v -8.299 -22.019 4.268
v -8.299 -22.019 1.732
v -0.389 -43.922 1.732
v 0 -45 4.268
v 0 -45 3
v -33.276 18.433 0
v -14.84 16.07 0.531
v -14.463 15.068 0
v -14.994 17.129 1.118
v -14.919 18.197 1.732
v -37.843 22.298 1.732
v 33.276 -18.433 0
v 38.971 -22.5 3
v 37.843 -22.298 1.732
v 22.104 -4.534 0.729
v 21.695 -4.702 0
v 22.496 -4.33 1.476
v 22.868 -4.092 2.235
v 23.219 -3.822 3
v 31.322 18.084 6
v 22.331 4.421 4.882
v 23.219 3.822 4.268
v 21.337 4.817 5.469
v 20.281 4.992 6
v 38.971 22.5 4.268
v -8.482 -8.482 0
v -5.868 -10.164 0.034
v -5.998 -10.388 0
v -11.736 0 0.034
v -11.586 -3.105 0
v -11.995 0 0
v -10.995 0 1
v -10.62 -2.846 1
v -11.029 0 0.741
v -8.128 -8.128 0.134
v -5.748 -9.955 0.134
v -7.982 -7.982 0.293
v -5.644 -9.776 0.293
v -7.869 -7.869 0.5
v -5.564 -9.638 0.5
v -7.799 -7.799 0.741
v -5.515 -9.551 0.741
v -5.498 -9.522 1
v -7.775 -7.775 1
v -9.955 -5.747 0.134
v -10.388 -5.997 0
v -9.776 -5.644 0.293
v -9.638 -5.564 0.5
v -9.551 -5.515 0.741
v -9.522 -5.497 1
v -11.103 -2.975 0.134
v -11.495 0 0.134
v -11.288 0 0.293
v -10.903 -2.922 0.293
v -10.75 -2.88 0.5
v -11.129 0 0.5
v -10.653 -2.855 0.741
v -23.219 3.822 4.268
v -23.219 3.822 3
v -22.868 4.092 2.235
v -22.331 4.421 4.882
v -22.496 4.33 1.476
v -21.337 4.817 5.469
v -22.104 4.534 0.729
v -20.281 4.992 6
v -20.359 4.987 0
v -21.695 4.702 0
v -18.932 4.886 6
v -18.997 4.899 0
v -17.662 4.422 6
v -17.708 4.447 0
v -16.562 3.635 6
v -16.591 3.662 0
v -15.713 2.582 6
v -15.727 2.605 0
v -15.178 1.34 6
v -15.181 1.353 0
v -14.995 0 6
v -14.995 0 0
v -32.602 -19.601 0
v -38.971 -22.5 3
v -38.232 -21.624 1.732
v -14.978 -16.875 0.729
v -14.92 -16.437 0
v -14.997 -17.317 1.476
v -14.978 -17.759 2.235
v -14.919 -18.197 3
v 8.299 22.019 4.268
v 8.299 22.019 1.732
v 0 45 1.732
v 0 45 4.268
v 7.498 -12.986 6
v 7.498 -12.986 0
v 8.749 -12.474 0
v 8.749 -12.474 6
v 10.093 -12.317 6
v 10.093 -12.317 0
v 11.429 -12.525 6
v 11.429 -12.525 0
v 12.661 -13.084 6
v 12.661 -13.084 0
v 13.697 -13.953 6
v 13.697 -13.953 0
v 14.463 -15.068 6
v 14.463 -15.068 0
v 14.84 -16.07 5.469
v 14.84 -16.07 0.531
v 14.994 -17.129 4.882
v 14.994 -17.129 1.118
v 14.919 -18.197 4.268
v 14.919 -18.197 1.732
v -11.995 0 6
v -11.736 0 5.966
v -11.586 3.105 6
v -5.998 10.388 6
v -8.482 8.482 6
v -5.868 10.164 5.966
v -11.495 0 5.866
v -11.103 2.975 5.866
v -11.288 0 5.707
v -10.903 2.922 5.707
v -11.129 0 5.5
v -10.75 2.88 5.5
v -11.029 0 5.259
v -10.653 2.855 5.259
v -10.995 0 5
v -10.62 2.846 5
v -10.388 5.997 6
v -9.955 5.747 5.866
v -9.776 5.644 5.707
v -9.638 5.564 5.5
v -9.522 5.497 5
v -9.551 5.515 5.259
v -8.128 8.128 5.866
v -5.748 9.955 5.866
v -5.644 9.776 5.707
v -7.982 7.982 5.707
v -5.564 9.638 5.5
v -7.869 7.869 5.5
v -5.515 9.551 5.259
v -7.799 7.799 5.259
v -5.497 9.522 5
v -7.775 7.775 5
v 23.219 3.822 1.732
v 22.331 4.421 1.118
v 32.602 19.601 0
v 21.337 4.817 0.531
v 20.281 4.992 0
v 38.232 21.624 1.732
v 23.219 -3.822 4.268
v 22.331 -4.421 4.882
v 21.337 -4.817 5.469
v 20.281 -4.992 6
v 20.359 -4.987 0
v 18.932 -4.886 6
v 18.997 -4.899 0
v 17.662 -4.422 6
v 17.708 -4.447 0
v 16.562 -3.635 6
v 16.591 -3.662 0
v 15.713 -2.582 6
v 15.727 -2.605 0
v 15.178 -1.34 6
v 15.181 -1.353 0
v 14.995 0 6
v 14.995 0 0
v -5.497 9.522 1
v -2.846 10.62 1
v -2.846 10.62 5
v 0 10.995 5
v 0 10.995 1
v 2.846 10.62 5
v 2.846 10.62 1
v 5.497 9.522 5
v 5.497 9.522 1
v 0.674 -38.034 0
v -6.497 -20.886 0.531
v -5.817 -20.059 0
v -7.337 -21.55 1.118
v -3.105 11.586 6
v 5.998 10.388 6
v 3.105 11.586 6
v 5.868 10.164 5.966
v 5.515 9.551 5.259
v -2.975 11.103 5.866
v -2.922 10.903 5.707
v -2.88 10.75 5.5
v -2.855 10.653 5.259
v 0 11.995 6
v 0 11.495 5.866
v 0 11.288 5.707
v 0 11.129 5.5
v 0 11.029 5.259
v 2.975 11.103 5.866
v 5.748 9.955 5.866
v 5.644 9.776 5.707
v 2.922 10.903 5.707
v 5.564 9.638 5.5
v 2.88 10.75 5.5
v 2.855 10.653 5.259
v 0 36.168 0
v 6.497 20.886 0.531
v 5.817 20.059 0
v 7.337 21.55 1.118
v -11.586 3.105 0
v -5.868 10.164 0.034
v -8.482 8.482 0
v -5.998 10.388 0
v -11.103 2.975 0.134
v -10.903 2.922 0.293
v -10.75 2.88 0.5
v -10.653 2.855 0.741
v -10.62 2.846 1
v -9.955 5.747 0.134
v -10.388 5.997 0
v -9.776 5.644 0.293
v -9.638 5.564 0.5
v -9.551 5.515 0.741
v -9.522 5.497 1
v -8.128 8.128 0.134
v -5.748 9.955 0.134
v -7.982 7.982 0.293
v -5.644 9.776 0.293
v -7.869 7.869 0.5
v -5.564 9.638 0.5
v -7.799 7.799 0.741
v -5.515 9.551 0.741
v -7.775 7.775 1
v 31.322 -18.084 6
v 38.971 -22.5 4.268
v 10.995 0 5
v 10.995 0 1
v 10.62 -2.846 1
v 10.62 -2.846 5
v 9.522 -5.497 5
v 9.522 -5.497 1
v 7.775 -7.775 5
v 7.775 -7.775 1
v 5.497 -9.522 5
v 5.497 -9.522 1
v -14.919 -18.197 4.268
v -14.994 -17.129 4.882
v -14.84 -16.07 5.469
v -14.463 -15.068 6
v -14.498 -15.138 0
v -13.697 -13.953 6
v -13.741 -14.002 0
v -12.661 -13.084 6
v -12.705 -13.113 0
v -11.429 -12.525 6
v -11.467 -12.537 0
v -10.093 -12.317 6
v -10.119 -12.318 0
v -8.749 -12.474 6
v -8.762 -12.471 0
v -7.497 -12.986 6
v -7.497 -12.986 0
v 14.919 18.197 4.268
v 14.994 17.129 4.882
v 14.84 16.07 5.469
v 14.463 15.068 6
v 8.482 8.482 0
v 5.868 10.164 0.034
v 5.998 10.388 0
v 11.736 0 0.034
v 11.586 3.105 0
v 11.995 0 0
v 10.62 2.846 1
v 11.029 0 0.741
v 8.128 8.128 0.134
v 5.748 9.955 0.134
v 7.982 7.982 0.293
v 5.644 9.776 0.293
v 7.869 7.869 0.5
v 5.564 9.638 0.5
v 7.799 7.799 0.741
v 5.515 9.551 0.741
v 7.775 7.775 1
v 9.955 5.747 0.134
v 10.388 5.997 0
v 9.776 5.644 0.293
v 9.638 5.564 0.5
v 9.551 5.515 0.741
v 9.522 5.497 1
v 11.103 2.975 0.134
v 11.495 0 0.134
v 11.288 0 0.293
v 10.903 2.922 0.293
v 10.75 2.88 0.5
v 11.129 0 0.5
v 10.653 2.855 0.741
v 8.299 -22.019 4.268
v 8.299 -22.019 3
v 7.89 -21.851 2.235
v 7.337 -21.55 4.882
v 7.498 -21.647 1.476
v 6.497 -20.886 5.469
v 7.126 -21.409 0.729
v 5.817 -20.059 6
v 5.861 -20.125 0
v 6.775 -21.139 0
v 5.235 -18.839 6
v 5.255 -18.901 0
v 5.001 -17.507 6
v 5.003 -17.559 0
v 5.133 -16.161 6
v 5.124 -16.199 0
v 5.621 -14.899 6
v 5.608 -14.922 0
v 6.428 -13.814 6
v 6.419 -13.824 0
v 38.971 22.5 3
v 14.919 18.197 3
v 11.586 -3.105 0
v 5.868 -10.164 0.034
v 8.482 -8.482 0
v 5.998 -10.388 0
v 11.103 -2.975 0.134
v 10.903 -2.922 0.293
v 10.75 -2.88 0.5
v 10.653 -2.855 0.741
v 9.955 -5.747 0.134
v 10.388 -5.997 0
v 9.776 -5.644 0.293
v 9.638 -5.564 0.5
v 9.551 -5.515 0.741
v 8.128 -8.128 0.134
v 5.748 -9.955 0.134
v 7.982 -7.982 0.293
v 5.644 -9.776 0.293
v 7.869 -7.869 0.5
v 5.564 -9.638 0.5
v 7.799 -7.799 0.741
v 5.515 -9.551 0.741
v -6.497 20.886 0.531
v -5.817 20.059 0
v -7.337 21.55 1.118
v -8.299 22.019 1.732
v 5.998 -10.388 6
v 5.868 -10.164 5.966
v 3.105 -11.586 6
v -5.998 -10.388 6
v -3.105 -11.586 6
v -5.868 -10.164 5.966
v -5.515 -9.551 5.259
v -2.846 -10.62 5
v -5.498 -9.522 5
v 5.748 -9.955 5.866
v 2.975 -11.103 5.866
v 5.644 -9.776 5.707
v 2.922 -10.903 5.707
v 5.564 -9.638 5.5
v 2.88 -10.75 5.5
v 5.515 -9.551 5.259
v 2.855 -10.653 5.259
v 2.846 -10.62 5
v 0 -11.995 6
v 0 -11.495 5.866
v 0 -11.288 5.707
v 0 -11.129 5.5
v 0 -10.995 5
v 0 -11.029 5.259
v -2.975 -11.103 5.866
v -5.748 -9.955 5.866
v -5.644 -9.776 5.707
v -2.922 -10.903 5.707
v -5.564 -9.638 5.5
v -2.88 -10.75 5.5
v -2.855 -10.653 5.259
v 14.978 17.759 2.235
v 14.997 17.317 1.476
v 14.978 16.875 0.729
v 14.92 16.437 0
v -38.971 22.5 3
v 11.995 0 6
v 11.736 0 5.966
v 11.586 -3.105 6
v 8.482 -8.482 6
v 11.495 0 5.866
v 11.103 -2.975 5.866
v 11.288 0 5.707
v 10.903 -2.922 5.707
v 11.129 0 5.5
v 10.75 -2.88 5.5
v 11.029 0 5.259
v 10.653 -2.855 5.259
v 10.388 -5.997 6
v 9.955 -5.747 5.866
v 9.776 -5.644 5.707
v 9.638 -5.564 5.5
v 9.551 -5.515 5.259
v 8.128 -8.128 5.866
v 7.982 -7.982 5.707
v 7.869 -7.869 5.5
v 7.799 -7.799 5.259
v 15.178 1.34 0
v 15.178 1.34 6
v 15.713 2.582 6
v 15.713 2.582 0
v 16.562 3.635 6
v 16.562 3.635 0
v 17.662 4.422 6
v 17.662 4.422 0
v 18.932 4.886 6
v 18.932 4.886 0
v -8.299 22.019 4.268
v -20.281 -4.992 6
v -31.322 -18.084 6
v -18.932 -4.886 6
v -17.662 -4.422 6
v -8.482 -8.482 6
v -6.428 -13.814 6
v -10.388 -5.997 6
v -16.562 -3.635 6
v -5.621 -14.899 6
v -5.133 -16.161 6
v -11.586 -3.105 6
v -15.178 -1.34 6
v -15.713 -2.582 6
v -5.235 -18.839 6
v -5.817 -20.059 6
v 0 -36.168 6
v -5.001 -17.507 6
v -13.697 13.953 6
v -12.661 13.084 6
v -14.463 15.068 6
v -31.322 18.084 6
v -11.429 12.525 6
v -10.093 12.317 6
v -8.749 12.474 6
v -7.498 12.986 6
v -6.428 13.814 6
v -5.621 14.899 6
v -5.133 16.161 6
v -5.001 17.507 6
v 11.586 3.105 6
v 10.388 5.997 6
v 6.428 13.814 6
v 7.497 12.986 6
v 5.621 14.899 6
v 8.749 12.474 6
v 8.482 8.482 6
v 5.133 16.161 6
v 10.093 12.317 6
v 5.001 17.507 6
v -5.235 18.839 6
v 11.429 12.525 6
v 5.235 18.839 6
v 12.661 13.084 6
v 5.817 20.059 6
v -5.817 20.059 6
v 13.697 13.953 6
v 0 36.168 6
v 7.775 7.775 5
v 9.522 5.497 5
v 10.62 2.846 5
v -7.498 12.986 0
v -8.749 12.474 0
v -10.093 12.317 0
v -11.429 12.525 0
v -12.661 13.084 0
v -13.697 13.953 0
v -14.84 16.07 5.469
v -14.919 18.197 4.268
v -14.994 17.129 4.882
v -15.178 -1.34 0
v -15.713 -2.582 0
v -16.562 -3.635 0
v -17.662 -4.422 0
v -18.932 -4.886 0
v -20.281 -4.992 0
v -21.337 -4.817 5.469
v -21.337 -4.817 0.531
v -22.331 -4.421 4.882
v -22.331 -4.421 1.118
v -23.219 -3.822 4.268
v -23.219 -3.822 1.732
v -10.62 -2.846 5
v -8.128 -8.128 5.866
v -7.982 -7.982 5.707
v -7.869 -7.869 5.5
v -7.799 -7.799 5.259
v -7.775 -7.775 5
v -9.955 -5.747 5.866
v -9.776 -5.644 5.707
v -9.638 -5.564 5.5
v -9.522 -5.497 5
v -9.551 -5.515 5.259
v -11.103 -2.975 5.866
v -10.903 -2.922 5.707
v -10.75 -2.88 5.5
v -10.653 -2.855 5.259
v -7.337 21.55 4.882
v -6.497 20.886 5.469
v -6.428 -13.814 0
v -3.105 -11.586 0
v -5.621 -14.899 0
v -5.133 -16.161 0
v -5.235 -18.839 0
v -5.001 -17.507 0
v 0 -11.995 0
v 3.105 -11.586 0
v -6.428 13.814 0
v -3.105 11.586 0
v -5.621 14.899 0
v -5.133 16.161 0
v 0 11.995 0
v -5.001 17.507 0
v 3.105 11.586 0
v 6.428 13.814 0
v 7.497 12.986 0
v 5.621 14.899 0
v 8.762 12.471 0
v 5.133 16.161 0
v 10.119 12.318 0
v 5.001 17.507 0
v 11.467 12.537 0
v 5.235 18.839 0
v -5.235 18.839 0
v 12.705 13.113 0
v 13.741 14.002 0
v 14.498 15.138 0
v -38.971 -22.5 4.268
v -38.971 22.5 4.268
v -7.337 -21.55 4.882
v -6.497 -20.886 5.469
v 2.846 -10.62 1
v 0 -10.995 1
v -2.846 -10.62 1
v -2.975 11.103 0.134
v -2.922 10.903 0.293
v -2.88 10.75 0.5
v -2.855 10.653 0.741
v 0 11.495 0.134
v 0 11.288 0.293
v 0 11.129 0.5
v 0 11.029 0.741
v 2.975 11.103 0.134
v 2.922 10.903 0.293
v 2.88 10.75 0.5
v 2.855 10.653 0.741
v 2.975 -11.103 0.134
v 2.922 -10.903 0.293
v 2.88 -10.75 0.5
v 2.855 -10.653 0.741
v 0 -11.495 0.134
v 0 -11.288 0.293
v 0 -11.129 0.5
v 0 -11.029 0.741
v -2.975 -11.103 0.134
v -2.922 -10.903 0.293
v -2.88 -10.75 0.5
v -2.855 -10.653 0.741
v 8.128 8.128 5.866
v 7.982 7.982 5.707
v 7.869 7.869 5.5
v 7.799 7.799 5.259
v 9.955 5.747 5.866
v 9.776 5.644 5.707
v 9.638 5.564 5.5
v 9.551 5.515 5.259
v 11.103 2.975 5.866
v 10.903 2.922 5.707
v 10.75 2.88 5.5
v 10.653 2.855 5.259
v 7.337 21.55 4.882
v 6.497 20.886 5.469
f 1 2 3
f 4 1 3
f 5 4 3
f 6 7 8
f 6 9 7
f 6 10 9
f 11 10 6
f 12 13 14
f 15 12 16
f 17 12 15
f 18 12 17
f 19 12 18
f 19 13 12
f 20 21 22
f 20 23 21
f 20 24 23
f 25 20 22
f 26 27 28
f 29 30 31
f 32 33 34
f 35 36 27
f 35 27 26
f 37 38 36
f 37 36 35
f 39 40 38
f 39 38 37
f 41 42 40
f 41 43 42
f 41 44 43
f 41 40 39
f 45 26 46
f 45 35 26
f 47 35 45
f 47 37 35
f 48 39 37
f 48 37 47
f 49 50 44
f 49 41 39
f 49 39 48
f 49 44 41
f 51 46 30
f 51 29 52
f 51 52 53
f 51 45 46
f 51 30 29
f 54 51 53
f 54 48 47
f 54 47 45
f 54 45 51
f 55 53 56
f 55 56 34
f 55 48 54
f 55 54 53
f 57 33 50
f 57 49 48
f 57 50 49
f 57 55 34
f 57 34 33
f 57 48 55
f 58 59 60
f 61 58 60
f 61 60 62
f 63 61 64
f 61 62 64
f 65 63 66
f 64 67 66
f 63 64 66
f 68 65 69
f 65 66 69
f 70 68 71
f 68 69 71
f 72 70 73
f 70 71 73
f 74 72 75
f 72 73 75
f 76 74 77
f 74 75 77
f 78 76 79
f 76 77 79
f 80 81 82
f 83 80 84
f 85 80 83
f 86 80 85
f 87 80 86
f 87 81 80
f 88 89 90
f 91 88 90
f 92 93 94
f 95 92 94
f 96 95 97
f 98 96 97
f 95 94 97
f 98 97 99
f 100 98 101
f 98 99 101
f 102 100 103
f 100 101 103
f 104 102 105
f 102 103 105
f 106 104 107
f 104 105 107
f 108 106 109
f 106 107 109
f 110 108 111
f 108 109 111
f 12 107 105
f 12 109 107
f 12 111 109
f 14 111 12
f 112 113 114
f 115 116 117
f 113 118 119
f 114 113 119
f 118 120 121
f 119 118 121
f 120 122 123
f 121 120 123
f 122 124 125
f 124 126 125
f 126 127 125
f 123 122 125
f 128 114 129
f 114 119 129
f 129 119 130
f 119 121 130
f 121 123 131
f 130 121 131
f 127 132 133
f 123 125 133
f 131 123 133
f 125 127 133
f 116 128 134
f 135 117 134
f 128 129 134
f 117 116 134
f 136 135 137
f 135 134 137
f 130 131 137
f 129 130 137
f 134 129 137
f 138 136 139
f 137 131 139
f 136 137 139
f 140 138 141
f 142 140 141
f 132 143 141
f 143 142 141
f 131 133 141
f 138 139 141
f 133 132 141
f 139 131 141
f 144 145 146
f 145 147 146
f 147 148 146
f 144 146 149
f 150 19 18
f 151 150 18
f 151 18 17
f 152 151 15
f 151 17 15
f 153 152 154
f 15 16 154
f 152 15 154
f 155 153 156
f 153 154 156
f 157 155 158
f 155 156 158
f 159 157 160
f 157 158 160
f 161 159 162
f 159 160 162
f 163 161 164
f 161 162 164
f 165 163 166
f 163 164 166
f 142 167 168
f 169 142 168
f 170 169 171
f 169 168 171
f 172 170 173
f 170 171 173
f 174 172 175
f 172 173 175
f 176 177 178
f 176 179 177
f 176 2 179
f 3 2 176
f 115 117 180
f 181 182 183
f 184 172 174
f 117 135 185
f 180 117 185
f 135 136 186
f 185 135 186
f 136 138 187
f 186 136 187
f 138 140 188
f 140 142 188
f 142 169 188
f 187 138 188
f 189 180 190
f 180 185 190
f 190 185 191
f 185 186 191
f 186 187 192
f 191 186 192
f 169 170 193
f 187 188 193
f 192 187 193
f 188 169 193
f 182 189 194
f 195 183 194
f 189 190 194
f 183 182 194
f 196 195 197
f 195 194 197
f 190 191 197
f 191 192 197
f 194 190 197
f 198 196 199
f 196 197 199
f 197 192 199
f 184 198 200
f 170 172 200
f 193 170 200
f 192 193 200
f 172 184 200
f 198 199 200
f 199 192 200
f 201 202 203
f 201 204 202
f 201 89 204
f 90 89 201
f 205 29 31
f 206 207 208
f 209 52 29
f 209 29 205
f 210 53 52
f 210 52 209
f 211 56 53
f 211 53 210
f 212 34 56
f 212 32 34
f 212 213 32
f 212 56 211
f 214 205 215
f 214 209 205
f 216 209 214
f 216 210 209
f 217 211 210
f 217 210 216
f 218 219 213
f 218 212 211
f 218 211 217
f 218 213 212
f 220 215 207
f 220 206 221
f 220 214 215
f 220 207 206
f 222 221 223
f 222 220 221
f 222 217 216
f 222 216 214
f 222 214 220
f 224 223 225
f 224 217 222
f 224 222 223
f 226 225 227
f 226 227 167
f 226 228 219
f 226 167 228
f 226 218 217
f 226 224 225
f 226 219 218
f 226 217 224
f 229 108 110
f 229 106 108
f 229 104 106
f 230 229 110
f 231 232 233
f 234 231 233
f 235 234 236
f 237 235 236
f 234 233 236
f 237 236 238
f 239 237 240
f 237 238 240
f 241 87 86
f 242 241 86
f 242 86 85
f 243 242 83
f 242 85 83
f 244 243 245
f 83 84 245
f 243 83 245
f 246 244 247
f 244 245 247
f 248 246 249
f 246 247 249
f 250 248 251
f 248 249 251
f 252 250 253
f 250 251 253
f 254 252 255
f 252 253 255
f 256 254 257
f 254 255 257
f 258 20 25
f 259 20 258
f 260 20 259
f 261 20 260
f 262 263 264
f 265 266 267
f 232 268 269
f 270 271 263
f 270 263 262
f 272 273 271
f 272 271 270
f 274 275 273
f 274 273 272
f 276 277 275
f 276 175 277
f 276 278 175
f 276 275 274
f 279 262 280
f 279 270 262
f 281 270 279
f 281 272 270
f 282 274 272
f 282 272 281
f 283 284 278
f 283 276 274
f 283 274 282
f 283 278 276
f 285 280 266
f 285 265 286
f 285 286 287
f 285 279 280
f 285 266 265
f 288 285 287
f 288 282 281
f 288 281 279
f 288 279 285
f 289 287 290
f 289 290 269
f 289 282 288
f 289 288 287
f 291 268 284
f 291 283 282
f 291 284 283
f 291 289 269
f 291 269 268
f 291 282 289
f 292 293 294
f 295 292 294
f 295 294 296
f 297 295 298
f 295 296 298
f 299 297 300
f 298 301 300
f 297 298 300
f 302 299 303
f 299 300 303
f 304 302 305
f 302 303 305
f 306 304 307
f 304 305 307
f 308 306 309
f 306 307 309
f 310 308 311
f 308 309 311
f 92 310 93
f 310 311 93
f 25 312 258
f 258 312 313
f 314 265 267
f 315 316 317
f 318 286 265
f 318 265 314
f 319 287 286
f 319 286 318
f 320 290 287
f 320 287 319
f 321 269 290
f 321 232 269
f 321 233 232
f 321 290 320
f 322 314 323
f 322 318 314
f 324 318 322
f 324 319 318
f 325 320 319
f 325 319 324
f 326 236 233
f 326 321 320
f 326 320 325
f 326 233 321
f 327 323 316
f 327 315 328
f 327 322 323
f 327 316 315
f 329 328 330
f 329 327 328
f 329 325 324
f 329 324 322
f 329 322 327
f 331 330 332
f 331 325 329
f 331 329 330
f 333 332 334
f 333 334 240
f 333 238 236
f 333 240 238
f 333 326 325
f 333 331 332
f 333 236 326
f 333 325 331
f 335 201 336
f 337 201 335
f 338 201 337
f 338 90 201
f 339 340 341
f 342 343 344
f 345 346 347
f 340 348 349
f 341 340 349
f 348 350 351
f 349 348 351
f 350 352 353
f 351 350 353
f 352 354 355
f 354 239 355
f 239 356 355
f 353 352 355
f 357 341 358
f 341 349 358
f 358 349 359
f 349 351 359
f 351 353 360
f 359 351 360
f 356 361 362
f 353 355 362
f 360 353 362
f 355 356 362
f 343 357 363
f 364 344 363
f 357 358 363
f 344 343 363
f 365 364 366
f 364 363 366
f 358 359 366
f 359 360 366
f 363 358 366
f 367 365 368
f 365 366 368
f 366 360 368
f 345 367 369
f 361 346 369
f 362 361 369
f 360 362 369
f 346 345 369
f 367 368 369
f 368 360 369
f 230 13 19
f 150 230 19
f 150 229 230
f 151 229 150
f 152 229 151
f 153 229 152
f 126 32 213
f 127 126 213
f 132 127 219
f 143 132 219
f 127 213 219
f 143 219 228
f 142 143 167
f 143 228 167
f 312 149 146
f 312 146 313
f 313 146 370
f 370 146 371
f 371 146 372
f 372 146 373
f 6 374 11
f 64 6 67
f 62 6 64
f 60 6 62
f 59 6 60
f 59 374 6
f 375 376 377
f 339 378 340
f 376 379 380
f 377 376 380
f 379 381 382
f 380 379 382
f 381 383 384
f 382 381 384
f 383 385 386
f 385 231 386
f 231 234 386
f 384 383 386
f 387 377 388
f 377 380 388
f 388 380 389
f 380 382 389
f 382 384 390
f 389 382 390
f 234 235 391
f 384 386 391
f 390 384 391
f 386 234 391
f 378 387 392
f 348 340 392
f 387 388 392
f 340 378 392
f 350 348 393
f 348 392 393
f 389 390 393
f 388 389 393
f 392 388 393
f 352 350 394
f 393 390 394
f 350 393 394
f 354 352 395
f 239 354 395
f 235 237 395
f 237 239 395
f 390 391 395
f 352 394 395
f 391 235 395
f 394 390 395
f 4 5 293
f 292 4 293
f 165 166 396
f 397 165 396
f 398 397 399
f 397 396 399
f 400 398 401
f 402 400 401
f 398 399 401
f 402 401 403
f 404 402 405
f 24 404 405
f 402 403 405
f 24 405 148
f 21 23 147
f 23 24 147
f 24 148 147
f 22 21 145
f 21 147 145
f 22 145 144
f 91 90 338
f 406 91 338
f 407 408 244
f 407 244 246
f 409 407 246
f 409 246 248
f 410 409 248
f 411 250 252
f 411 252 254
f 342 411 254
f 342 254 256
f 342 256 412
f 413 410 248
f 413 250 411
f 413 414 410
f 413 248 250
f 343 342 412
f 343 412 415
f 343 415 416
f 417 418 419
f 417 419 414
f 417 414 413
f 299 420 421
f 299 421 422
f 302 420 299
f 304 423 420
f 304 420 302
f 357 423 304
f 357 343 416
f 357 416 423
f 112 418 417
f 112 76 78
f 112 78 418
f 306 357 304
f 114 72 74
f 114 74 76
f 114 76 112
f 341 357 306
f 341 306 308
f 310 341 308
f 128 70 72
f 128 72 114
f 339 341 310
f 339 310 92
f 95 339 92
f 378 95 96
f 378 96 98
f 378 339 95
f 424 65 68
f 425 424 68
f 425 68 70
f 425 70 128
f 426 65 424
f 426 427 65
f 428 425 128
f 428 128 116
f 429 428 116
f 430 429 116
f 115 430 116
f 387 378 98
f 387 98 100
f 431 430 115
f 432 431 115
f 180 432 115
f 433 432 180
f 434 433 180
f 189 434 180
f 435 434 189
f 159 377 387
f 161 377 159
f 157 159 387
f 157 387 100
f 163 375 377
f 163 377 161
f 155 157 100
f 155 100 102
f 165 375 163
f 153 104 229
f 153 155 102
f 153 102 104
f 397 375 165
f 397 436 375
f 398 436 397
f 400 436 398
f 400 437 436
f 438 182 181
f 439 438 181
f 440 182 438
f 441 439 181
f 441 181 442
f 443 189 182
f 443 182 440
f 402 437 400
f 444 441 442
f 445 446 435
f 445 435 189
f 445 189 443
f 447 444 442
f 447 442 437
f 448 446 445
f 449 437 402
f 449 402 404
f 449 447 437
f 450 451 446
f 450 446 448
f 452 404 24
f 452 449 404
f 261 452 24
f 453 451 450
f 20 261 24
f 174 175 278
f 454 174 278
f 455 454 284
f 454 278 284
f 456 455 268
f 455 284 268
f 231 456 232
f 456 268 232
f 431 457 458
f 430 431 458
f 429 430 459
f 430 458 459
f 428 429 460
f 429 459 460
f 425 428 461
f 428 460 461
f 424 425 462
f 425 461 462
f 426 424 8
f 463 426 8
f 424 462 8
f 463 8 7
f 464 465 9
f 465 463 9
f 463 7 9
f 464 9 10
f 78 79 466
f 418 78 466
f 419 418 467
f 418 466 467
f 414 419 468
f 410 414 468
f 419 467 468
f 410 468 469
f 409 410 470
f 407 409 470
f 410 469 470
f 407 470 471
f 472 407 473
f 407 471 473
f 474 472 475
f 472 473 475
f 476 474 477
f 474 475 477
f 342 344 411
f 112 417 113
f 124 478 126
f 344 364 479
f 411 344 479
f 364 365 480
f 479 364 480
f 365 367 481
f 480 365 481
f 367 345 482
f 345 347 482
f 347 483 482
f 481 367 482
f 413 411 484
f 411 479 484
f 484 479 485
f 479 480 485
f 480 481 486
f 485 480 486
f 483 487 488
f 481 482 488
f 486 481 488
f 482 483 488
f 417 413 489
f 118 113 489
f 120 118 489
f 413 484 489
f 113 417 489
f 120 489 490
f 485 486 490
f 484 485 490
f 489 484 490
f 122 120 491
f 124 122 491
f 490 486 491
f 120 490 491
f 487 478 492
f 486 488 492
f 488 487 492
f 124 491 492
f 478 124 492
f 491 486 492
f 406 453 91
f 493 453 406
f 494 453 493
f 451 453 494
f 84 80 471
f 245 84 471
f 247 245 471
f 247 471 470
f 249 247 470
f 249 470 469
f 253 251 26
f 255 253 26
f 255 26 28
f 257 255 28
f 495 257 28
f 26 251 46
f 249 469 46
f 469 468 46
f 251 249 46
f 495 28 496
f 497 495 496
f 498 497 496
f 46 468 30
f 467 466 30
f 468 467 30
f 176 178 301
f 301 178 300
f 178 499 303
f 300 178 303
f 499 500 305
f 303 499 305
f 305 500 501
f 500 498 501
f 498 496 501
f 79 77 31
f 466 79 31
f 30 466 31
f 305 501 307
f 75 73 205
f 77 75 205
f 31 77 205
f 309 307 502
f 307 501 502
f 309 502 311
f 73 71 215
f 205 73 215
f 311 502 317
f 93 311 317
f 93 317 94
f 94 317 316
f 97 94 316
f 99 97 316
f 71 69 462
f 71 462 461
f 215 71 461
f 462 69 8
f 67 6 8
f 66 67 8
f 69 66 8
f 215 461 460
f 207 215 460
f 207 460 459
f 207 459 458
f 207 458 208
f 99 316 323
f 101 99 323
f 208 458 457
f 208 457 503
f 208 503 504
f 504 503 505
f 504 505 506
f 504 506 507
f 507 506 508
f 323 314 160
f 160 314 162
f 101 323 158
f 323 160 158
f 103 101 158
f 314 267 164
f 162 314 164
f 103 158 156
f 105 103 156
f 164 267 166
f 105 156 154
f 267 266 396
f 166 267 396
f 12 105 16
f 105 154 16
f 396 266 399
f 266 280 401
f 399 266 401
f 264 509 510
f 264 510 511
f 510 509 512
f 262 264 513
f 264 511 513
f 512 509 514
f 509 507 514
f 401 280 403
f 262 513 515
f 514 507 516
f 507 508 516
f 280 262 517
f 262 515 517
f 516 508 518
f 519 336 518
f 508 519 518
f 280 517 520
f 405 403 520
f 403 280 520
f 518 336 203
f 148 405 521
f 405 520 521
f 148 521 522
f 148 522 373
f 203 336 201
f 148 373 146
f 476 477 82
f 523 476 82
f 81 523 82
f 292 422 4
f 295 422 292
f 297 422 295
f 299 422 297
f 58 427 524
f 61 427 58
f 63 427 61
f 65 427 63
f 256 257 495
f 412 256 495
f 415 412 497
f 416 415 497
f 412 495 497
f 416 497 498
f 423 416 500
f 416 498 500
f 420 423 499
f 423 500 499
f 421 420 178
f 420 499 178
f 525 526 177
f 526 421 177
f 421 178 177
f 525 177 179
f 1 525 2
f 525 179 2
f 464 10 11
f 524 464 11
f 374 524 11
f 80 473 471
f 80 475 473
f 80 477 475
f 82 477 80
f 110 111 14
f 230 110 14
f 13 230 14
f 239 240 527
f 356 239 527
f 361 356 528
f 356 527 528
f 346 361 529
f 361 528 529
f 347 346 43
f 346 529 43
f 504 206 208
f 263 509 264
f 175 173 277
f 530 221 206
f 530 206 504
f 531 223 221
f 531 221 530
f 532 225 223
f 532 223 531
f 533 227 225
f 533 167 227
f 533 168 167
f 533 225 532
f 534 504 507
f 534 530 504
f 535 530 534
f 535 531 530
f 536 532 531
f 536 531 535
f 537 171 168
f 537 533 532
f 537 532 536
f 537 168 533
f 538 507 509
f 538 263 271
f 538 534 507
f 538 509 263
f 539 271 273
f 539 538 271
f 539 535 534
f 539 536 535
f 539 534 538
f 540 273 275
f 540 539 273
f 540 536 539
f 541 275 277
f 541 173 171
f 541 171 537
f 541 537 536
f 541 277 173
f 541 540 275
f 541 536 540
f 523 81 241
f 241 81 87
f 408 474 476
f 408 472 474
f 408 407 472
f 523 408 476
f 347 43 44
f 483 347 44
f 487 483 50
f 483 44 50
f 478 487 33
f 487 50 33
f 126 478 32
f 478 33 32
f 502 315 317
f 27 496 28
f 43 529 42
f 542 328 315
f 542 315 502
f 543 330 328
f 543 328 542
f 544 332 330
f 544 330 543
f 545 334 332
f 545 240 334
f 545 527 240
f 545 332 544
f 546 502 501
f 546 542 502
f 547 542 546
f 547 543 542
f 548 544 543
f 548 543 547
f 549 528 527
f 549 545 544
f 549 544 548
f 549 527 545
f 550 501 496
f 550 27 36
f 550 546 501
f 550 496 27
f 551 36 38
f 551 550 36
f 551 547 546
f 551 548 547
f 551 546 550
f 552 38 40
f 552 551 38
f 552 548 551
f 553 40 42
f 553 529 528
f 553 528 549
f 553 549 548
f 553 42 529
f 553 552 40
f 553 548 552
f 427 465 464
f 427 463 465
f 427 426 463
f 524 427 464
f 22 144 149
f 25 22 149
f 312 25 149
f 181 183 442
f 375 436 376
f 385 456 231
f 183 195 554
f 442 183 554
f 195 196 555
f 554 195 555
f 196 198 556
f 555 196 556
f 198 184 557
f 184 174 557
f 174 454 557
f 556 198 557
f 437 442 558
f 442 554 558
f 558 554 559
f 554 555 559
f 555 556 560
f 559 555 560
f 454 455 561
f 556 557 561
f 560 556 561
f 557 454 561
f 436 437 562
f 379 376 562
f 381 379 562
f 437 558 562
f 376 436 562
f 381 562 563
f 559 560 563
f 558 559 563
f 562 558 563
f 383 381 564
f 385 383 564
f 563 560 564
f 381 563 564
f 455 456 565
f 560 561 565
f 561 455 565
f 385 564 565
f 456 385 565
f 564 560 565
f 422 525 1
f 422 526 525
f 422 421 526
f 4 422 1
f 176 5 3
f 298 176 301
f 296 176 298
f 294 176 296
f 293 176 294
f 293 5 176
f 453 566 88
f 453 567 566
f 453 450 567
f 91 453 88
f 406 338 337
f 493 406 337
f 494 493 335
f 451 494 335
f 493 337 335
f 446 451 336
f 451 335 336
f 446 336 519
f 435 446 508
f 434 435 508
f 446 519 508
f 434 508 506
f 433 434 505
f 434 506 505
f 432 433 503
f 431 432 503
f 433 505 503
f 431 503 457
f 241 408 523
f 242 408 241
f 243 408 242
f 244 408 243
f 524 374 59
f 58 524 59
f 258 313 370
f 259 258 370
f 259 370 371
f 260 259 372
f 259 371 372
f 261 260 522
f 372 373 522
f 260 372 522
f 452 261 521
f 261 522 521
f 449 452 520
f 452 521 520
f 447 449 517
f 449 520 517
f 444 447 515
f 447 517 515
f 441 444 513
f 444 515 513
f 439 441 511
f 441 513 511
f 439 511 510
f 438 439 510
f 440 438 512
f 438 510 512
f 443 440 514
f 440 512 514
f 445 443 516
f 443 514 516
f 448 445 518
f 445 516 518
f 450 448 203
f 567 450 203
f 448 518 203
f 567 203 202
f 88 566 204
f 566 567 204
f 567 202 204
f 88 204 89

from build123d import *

# Parameters (mm, degrees)
F1_DEPTH     = 6
F2_C1_SIZE2  = 3
F2_C1_SIZE   = 1.7320508076
F2_C2_SIZE2  = 3
F2_C2_SIZE   = 1.7320508076
F2_C3_SIZE2  = 1.7320508076
F2_C3_SIZE   = 3
F2_C4_SIZE2  = 3
F2_C4_SIZE   = 1.7320508076
F2_C5_SIZE2  = 1.7320508076
F2_C5_SIZE   = 3
F2_C6_SIZE2  = 3
F2_C6_SIZE   = 1.7320508076
F2_C7_SIZE2  = 1.7320508076
F2_C7_SIZE   = 3
F2_C8_SIZE2  = 3
F2_C8_SIZE   = 1.7320508076
F2_C9_SIZE2  = 1.7320508076
F2_C9_SIZE   = 3
F2_C10_SIZE2 = 3
F2_C10_SIZE  = 1.7320508076
F2_C11_SIZE2 = 3
F2_C11_SIZE  = 1.7320508076
F2_C12_SIZE2 = 3
F2_C12_SIZE  = 1.7320508076
F2_C13_SIZE2 = 1.7320508076
F2_C13_SIZE  = 3
F2_C14_SIZE2 = 3
F2_C14_SIZE  = 1.7320508076
F2_C15_SIZE2 = 3
F2_C15_SIZE  = 1.7320508076
F2_C16_SIZE2 = 3
F2_C16_SIZE  = 1.7320508076
F2_C17_SIZE2 = 1.7320508076
F2_C17_SIZE  = 3
F2_C18_SIZE2 = 3
F2_C18_SIZE  = 1.7320508076
F2_C19_SIZE2 = 3
F2_C19_SIZE  = 1.7320508076
F2_C20_SIZE2 = 3
F2_C20_SIZE  = 1.7320508076
F2_C21_SIZE2 = 1.7320508076
F2_C21_SIZE  = 3
F2_C22_SIZE2 = 3
F2_C22_SIZE  = 1.7320508076
F2_C23_SIZE2 = 3
F2_C23_SIZE  = 1.7320508076
F2_C24_SIZE2 = 3
F2_C24_SIZE  = 1.7320508076
F3_R         = 1


with BuildPart() as f1:
    # F0 (on Top) → F1 (new body)
    with BuildSketch(Plane.XY):
        with BuildLine():
            ThreePointArc((5.4975, 9.5219493146), (9.5219493146, 5.4975), (10.995, 0))
            Line((10.995, 0), (14.995, 0))
            ThreePointArc((14.995, 0), (17.8875950663, 4.5341861944), (23.2185377782, 3.8221465425))
            Line((23.2185377782, 3.8221465425), (38.9711431703, 22.5))
            Line((38.9711431703, 22.5), (14.9193448919, 18.1967702834))
            ThreePointArc((14.9193448919, 18.1967702834), (12.870517963, 13.2240186428), (7.4975, 12.9860509297))
            Line((7.4975, 12.9860509297), (5.4975, 9.5219493146))
        make_face()
        with BuildLine():
            ThreePointArc((-5.4975, 9.5219493146), (0, 10.995), (5.4975, 9.5219493146))
            Line((5.4975, 9.5219493146), (7.4975, 12.9860509297))
            ThreePointArc((7.4975, 12.9860509297), (5.0170771033, 17.7582048372), (8.2991928863, 22.0189168259))
            Line((8.2991928863, 22.0189168259), (0, 45))
            Line((0, 45), (-8.2991928863, 22.0189168259))
            ThreePointArc((-8.2991928863, 22.0189168259), (-5.0170771033, 17.7582048372), (-7.4975, 12.9860509297))
            Line((-7.4975, 12.9860509297), (-5.4975, 9.5219493146))
        make_face()
        with BuildLine():
            ThreePointArc((-10.995, 0), (-9.5219493146, 5.4975), (-5.4975, 9.5219493146))
            Line((-5.4975, 9.5219493146), (-7.4975, 12.9860509297))
            ThreePointArc((-7.4975, 12.9860509297), (-12.870517963, 13.2240186428), (-14.9193448919, 18.1967702834))
            Line((-14.9193448919, 18.1967702834), (-38.9711431703, 22.5))
            Line((-38.9711431703, 22.5), (-23.2185377782, 3.8221465425))
            ThreePointArc((-23.2185377782, 3.8221465425), (-17.8875950663, 4.5341861944), (-14.995, 0))
            Line((-14.995, 0), (-10.995, 0))
        make_face()
        with BuildLine():
            Line((-7.4975, -12.9860509297), (-5.4975, -9.5219493146))
            ThreePointArc((-5.4975, -9.5219493146), (-9.5219493146, -5.4975), (-10.995, 0))
            Line((-10.995, 0), (-14.995, 0))
            ThreePointArc((-14.995, 0), (-17.8875950663, -4.5341861944), (-23.2185377782, -3.8221465425))
            Line((-23.2185377782, -3.8221465425), (-38.9711431703, -22.5))
            Line((-38.9711431703, -22.5), (-14.9193448919, -18.1967702834))
            ThreePointArc((-14.9193448919, -18.1967702834), (-12.870517963, -13.2240186428), (-7.4975, -12.9860509297))
        make_face()
        with BuildLine():
            Line((7.4975, -12.9860509297), (5.4975, -9.5219493146))
            ThreePointArc((5.4975, -9.5219493146), (0, -10.995), (-5.4975, -9.5219493146))
            Line((-5.4975, -9.5219493146), (-7.4975, -12.9860509297))
            ThreePointArc((-7.4975, -12.9860509297), (-5.0170771033, -17.7582048372), (-8.2991928863, -22.0189168259))
            Line((-8.2991928863, -22.0189168259), (0, -45))
            Line((0, -45), (8.2991928863, -22.0189168259))
            ThreePointArc((8.2991928863, -22.0189168259), (5.0170771033, -17.7582048372), (7.4975, -12.9860509297))
        make_face()
        with BuildLine():
            Line((14.995, 0), (10.995, 0))
            ThreePointArc((10.995, 0), (9.5219493146, -5.4975), (5.4975, -9.5219493146))
            Line((5.4975, -9.5219493146), (7.4975, -12.9860509297))
            ThreePointArc((7.4975, -12.9860509297), (12.870517963, -13.2240186428), (14.9193448919, -18.1967702834))
            Line((14.9193448919, -18.1967702834), (38.9711431703, -22.5))
            Line((38.9711431703, -22.5), (23.2185377782, -3.8221465425))
            ThreePointArc((23.2185377782, -3.8221465425), (17.8875950663, -4.5341861944), (14.995, 0))
        make_face()
    extrude(amount=F1_DEPTH)

    # F2: chamfer of 3 x 1.7320508076 on 24 edges, made by hand

    # F2_c1
    f2_c1_edges = [f1.edges().sort_by_distance(p)[0] for p in [
        (31.0948404742, 13.1610732713, 0),
    ]]
    f2_c1_side = f1.faces().sort_by_distance((31.0948404742, 13.1610732713, 0.0346410162))[0]
    chamfer(f2_c1_edges, length=F2_C1_SIZE, length2=F2_C1_SIZE2, reference=f2_c1_side)

    # F2_c2
    f2_c2_edges = [f1.edges().sort_by_distance(p)[0] for p in [
        (31.0948404742, 13.1610732713, 6),
    ]]
    f2_c2_side = f1.faces().sort_by_distance((31.0948404742, 13.1610732713, 5.9653589838))[0]
    chamfer(f2_c2_edges, length=F2_C2_SIZE, length2=F2_C2_SIZE2, reference=f2_c2_side)

    # F2_c3
    f2_c3_edges = [f1.edges().sort_by_distance(p)[0] for p in [
        (24.6342857936, 19.9349198346, 0),
    ]]
    f2_c3_side = f1.faces().sort_by_distance((24.6342857936, 19.9349198346, 0.0346410162))[0]
    chamfer(f2_c3_edges, length=F2_C3_SIZE, length2=F2_C3_SIZE2, reference=f2_c3_side)

    # F2_c4
    f2_c4_edges = [f1.edges().sort_by_distance(p)[0] for p in [
        (24.6342857936, 19.9349198346, 6),
    ]]
    f2_c4_side = f1.faces().sort_by_distance((24.6342857936, 19.9349198346, 5.9653589838))[0]
    chamfer(f2_c4_edges, length=F2_C4_SIZE, length2=F2_C4_SIZE2, reference=f2_c4_side)

    # F2_c5
    f2_c5_edges = [f1.edges().sort_by_distance(p)[0] for p in [
        (4.1495964431, 33.509458413, 0),
    ]]
    f2_c5_side = f1.faces().sort_by_distance((4.1170149125, 33.4976921961, 0))[0]
    chamfer(f2_c5_edges, length=F2_C5_SIZE, length2=F2_C5_SIZE2, reference=f2_c5_side)

    # F2_c6
    f2_c6_edges = [f1.edges().sort_by_distance(p)[0] for p in [
        (4.1495964431, 33.509458413, 6),
    ]]
    f2_c6_side = f1.faces().sort_by_distance((4.1495964431, 33.509458413, 5.9653589838))[0]
    chamfer(f2_c6_edges, length=F2_C6_SIZE, length2=F2_C6_SIZE2, reference=f2_c6_side)

    # F2_c7
    f2_c7_edges = [f1.edges().sort_by_distance(p)[0] for p in [
        (-4.9470041023, 31.3013772186, 0),
    ]]
    f2_c7_side = f1.faces().sort_by_distance((-4.9144225717, 31.2896110018, 0))[0]
    chamfer(f2_c7_edges, length=F2_C7_SIZE, length2=F2_C7_SIZE2, reference=f2_c7_side)

    # F2_c8
    f2_c8_edges = [f1.edges().sort_by_distance(p)[0] for p in [
        (-4.9470041023, 31.3013772186, 6),
    ]]
    f2_c8_side = f1.faces().sort_by_distance((-4.9470041023, 31.3013772186, 5.9653589838))[0]
    chamfer(f2_c8_edges, length=F2_C8_SIZE, length2=F2_C8_SIZE2, reference=f2_c8_side)

    # F2_c9
    f2_c9_edges = [f1.edges().sort_by_distance(p)[0] for p in [
        (-26.9452440311, 20.3483851417, 0),
    ]]
    f2_c9_side = f1.faces().sort_by_distance((-26.9513449538, 20.3142856, 0))[0]
    chamfer(f2_c9_edges, length=F2_C9_SIZE, length2=F2_C9_SIZE2, reference=f2_c9_side)

    # F2_c10
    f2_c10_edges = [f1.edges().sort_by_distance(p)[0] for p in [
        (-26.9452440311, 20.3483851417, 6),
    ]]
    f2_c10_side = f1.faces().sort_by_distance((-26.9452440311, 20.3483851417, 5.9653589838))[0]
    chamfer(f2_c10_edges, length=F2_C10_SIZE, length2=F2_C10_SIZE2, reference=f2_c10_side)

    # F2_c11
    f2_c11_edges = [f1.edges().sort_by_distance(p)[0] for p in [
        (-29.581289896, 11.3664573841, 0),
    ]]
    f2_c11_side = f1.faces().sort_by_distance((-29.5548092879, 11.3887907089, 0))[0]
    chamfer(f2_c11_edges, length=F2_C11_SIZE, length2=F2_C11_SIZE2, reference=f2_c11_side)

    # F2_c12
    f2_c12_edges = [f1.edges().sort_by_distance(p)[0] for p in [
        (-29.581289896, 11.3664573841, 6),
    ]]
    f2_c12_side = f1.faces().sort_by_distance((-29.581289896, 11.3664573841, 5.9653589838))[0]
    chamfer(f2_c12_edges, length=F2_C12_SIZE, length2=F2_C12_SIZE2, reference=f2_c12_side)

    # F2_c13
    f2_c13_edges = [f1.edges().sort_by_distance(p)[0] for p in [
        (-31.0948404742, -13.1610732713, 0),
    ]]
    f2_c13_side = f1.faces().sort_by_distance((-31.0683598662, -13.1834065961, 0))[0]
    chamfer(f2_c13_edges, length=F2_C13_SIZE, length2=F2_C13_SIZE2, reference=f2_c13_side)

    # F2_c14
    f2_c14_edges = [f1.edges().sort_by_distance(p)[0] for p in [
        (-31.0948404742, -13.1610732713, 6),
    ]]
    f2_c14_side = f1.faces().sort_by_distance((-31.0948404742, -13.1610732713, 5.9653589838))[0]
    chamfer(f2_c14_edges, length=F2_C14_SIZE, length2=F2_C14_SIZE2, reference=f2_c14_side)

    # F2_c15
    f2_c15_edges = [f1.edges().sort_by_distance(p)[0] for p in [
        (-24.6342857936, -19.9349198346, 0),
    ]]
    f2_c15_side = f1.faces().sort_by_distance((-24.6403867163, -19.9008202929, 0))[0]
    chamfer(f2_c15_edges, length=F2_C15_SIZE, length2=F2_C15_SIZE2, reference=f2_c15_side)

    # F2_c16
    f2_c16_edges = [f1.edges().sort_by_distance(p)[0] for p in [
        (-24.6342857936, -19.9349198346, 6),
    ]]
    f2_c16_side = f1.faces().sort_by_distance((-24.6342857936, -19.9349198346, 5.9653589838))[0]
    chamfer(f2_c16_edges, length=F2_C16_SIZE, length2=F2_C16_SIZE2, reference=f2_c16_side)

    # F2_c17
    f2_c17_edges = [f1.edges().sort_by_distance(p)[0] for p in [
        (-4.1495964431, -33.509458413, 0),
    ]]
    f2_c17_side = f1.faces().sort_by_distance((-4.1170149125, -33.4976921961, 0))[0]
    chamfer(f2_c17_edges, length=F2_C17_SIZE, length2=F2_C17_SIZE2, reference=f2_c17_side)

    # F2_c18
    f2_c18_edges = [f1.edges().sort_by_distance(p)[0] for p in [
        (-4.1495964431, -33.509458413, 6),
    ]]
    f2_c18_side = f1.faces().sort_by_distance((-4.1495964431, -33.509458413, 5.9653589838))[0]
    chamfer(f2_c18_edges, length=F2_C18_SIZE, length2=F2_C18_SIZE2, reference=f2_c18_side)

    # F2_c19
    f2_c19_edges = [f1.edges().sort_by_distance(p)[0] for p in [
        (4.9470041023, -31.3013772186, 0),
    ]]
    f2_c19_side = f1.faces().sort_by_distance((4.9144225717, -31.2896110018, 0))[0]
    chamfer(f2_c19_edges, length=F2_C19_SIZE, length2=F2_C19_SIZE2, reference=f2_c19_side)

    # F2_c20
    f2_c20_edges = [f1.edges().sort_by_distance(p)[0] for p in [
        (4.9470041023, -31.3013772186, 6),
    ]]
    f2_c20_side = f1.faces().sort_by_distance((4.9470041023, -31.3013772186, 5.9653589838))[0]
    chamfer(f2_c20_edges, length=F2_C20_SIZE, length2=F2_C20_SIZE2, reference=f2_c20_side)

    # F2_c21
    f2_c21_edges = [f1.edges().sort_by_distance(p)[0] for p in [
        (26.9452440311, -20.3483851417, 0),
    ]]
    f2_c21_side = f1.faces().sort_by_distance((26.9513449538, -20.3142856, 0))[0]
    chamfer(f2_c21_edges, length=F2_C21_SIZE, length2=F2_C21_SIZE2, reference=f2_c21_side)

    # F2_c22
    f2_c22_edges = [f1.edges().sort_by_distance(p)[0] for p in [
        (26.9452440311, -20.3483851417, 6),
    ]]
    f2_c22_side = f1.faces().sort_by_distance((26.9452440311, -20.3483851417, 5.9653589838))[0]
    chamfer(f2_c22_edges, length=F2_C22_SIZE, length2=F2_C22_SIZE2, reference=f2_c22_side)

    # F2_c23
    f2_c23_edges = [f1.edges().sort_by_distance(p)[0] for p in [
        (29.581289896, -11.3664573841, 0),
    ]]
    f2_c23_side = f1.faces().sort_by_distance((29.5548092879, -11.3887907089, 0))[0]
    chamfer(f2_c23_edges, length=F2_C23_SIZE, length2=F2_C23_SIZE2, reference=f2_c23_side)

    # F2_c24
    f2_c24_edges = [f1.edges().sort_by_distance(p)[0] for p in [
        (29.581289896, -11.3664573841, 6),
    ]]
    f2_c24_side = f1.faces().sort_by_distance((29.581289896, -11.3664573841, 5.9653589838))[0]
    chamfer(f2_c24_edges, length=F2_C24_SIZE, length2=F2_C24_SIZE2, reference=f2_c24_side)

    # F3
    f3_edges = [f1.edges().sort_by_distance(p)[0] for p in [
        (-10.995, 0, 0),
        (-10.995, 0, 6),
    ]]
    fillet(f3_edges, radius=F3_R)


solid = f1.part
